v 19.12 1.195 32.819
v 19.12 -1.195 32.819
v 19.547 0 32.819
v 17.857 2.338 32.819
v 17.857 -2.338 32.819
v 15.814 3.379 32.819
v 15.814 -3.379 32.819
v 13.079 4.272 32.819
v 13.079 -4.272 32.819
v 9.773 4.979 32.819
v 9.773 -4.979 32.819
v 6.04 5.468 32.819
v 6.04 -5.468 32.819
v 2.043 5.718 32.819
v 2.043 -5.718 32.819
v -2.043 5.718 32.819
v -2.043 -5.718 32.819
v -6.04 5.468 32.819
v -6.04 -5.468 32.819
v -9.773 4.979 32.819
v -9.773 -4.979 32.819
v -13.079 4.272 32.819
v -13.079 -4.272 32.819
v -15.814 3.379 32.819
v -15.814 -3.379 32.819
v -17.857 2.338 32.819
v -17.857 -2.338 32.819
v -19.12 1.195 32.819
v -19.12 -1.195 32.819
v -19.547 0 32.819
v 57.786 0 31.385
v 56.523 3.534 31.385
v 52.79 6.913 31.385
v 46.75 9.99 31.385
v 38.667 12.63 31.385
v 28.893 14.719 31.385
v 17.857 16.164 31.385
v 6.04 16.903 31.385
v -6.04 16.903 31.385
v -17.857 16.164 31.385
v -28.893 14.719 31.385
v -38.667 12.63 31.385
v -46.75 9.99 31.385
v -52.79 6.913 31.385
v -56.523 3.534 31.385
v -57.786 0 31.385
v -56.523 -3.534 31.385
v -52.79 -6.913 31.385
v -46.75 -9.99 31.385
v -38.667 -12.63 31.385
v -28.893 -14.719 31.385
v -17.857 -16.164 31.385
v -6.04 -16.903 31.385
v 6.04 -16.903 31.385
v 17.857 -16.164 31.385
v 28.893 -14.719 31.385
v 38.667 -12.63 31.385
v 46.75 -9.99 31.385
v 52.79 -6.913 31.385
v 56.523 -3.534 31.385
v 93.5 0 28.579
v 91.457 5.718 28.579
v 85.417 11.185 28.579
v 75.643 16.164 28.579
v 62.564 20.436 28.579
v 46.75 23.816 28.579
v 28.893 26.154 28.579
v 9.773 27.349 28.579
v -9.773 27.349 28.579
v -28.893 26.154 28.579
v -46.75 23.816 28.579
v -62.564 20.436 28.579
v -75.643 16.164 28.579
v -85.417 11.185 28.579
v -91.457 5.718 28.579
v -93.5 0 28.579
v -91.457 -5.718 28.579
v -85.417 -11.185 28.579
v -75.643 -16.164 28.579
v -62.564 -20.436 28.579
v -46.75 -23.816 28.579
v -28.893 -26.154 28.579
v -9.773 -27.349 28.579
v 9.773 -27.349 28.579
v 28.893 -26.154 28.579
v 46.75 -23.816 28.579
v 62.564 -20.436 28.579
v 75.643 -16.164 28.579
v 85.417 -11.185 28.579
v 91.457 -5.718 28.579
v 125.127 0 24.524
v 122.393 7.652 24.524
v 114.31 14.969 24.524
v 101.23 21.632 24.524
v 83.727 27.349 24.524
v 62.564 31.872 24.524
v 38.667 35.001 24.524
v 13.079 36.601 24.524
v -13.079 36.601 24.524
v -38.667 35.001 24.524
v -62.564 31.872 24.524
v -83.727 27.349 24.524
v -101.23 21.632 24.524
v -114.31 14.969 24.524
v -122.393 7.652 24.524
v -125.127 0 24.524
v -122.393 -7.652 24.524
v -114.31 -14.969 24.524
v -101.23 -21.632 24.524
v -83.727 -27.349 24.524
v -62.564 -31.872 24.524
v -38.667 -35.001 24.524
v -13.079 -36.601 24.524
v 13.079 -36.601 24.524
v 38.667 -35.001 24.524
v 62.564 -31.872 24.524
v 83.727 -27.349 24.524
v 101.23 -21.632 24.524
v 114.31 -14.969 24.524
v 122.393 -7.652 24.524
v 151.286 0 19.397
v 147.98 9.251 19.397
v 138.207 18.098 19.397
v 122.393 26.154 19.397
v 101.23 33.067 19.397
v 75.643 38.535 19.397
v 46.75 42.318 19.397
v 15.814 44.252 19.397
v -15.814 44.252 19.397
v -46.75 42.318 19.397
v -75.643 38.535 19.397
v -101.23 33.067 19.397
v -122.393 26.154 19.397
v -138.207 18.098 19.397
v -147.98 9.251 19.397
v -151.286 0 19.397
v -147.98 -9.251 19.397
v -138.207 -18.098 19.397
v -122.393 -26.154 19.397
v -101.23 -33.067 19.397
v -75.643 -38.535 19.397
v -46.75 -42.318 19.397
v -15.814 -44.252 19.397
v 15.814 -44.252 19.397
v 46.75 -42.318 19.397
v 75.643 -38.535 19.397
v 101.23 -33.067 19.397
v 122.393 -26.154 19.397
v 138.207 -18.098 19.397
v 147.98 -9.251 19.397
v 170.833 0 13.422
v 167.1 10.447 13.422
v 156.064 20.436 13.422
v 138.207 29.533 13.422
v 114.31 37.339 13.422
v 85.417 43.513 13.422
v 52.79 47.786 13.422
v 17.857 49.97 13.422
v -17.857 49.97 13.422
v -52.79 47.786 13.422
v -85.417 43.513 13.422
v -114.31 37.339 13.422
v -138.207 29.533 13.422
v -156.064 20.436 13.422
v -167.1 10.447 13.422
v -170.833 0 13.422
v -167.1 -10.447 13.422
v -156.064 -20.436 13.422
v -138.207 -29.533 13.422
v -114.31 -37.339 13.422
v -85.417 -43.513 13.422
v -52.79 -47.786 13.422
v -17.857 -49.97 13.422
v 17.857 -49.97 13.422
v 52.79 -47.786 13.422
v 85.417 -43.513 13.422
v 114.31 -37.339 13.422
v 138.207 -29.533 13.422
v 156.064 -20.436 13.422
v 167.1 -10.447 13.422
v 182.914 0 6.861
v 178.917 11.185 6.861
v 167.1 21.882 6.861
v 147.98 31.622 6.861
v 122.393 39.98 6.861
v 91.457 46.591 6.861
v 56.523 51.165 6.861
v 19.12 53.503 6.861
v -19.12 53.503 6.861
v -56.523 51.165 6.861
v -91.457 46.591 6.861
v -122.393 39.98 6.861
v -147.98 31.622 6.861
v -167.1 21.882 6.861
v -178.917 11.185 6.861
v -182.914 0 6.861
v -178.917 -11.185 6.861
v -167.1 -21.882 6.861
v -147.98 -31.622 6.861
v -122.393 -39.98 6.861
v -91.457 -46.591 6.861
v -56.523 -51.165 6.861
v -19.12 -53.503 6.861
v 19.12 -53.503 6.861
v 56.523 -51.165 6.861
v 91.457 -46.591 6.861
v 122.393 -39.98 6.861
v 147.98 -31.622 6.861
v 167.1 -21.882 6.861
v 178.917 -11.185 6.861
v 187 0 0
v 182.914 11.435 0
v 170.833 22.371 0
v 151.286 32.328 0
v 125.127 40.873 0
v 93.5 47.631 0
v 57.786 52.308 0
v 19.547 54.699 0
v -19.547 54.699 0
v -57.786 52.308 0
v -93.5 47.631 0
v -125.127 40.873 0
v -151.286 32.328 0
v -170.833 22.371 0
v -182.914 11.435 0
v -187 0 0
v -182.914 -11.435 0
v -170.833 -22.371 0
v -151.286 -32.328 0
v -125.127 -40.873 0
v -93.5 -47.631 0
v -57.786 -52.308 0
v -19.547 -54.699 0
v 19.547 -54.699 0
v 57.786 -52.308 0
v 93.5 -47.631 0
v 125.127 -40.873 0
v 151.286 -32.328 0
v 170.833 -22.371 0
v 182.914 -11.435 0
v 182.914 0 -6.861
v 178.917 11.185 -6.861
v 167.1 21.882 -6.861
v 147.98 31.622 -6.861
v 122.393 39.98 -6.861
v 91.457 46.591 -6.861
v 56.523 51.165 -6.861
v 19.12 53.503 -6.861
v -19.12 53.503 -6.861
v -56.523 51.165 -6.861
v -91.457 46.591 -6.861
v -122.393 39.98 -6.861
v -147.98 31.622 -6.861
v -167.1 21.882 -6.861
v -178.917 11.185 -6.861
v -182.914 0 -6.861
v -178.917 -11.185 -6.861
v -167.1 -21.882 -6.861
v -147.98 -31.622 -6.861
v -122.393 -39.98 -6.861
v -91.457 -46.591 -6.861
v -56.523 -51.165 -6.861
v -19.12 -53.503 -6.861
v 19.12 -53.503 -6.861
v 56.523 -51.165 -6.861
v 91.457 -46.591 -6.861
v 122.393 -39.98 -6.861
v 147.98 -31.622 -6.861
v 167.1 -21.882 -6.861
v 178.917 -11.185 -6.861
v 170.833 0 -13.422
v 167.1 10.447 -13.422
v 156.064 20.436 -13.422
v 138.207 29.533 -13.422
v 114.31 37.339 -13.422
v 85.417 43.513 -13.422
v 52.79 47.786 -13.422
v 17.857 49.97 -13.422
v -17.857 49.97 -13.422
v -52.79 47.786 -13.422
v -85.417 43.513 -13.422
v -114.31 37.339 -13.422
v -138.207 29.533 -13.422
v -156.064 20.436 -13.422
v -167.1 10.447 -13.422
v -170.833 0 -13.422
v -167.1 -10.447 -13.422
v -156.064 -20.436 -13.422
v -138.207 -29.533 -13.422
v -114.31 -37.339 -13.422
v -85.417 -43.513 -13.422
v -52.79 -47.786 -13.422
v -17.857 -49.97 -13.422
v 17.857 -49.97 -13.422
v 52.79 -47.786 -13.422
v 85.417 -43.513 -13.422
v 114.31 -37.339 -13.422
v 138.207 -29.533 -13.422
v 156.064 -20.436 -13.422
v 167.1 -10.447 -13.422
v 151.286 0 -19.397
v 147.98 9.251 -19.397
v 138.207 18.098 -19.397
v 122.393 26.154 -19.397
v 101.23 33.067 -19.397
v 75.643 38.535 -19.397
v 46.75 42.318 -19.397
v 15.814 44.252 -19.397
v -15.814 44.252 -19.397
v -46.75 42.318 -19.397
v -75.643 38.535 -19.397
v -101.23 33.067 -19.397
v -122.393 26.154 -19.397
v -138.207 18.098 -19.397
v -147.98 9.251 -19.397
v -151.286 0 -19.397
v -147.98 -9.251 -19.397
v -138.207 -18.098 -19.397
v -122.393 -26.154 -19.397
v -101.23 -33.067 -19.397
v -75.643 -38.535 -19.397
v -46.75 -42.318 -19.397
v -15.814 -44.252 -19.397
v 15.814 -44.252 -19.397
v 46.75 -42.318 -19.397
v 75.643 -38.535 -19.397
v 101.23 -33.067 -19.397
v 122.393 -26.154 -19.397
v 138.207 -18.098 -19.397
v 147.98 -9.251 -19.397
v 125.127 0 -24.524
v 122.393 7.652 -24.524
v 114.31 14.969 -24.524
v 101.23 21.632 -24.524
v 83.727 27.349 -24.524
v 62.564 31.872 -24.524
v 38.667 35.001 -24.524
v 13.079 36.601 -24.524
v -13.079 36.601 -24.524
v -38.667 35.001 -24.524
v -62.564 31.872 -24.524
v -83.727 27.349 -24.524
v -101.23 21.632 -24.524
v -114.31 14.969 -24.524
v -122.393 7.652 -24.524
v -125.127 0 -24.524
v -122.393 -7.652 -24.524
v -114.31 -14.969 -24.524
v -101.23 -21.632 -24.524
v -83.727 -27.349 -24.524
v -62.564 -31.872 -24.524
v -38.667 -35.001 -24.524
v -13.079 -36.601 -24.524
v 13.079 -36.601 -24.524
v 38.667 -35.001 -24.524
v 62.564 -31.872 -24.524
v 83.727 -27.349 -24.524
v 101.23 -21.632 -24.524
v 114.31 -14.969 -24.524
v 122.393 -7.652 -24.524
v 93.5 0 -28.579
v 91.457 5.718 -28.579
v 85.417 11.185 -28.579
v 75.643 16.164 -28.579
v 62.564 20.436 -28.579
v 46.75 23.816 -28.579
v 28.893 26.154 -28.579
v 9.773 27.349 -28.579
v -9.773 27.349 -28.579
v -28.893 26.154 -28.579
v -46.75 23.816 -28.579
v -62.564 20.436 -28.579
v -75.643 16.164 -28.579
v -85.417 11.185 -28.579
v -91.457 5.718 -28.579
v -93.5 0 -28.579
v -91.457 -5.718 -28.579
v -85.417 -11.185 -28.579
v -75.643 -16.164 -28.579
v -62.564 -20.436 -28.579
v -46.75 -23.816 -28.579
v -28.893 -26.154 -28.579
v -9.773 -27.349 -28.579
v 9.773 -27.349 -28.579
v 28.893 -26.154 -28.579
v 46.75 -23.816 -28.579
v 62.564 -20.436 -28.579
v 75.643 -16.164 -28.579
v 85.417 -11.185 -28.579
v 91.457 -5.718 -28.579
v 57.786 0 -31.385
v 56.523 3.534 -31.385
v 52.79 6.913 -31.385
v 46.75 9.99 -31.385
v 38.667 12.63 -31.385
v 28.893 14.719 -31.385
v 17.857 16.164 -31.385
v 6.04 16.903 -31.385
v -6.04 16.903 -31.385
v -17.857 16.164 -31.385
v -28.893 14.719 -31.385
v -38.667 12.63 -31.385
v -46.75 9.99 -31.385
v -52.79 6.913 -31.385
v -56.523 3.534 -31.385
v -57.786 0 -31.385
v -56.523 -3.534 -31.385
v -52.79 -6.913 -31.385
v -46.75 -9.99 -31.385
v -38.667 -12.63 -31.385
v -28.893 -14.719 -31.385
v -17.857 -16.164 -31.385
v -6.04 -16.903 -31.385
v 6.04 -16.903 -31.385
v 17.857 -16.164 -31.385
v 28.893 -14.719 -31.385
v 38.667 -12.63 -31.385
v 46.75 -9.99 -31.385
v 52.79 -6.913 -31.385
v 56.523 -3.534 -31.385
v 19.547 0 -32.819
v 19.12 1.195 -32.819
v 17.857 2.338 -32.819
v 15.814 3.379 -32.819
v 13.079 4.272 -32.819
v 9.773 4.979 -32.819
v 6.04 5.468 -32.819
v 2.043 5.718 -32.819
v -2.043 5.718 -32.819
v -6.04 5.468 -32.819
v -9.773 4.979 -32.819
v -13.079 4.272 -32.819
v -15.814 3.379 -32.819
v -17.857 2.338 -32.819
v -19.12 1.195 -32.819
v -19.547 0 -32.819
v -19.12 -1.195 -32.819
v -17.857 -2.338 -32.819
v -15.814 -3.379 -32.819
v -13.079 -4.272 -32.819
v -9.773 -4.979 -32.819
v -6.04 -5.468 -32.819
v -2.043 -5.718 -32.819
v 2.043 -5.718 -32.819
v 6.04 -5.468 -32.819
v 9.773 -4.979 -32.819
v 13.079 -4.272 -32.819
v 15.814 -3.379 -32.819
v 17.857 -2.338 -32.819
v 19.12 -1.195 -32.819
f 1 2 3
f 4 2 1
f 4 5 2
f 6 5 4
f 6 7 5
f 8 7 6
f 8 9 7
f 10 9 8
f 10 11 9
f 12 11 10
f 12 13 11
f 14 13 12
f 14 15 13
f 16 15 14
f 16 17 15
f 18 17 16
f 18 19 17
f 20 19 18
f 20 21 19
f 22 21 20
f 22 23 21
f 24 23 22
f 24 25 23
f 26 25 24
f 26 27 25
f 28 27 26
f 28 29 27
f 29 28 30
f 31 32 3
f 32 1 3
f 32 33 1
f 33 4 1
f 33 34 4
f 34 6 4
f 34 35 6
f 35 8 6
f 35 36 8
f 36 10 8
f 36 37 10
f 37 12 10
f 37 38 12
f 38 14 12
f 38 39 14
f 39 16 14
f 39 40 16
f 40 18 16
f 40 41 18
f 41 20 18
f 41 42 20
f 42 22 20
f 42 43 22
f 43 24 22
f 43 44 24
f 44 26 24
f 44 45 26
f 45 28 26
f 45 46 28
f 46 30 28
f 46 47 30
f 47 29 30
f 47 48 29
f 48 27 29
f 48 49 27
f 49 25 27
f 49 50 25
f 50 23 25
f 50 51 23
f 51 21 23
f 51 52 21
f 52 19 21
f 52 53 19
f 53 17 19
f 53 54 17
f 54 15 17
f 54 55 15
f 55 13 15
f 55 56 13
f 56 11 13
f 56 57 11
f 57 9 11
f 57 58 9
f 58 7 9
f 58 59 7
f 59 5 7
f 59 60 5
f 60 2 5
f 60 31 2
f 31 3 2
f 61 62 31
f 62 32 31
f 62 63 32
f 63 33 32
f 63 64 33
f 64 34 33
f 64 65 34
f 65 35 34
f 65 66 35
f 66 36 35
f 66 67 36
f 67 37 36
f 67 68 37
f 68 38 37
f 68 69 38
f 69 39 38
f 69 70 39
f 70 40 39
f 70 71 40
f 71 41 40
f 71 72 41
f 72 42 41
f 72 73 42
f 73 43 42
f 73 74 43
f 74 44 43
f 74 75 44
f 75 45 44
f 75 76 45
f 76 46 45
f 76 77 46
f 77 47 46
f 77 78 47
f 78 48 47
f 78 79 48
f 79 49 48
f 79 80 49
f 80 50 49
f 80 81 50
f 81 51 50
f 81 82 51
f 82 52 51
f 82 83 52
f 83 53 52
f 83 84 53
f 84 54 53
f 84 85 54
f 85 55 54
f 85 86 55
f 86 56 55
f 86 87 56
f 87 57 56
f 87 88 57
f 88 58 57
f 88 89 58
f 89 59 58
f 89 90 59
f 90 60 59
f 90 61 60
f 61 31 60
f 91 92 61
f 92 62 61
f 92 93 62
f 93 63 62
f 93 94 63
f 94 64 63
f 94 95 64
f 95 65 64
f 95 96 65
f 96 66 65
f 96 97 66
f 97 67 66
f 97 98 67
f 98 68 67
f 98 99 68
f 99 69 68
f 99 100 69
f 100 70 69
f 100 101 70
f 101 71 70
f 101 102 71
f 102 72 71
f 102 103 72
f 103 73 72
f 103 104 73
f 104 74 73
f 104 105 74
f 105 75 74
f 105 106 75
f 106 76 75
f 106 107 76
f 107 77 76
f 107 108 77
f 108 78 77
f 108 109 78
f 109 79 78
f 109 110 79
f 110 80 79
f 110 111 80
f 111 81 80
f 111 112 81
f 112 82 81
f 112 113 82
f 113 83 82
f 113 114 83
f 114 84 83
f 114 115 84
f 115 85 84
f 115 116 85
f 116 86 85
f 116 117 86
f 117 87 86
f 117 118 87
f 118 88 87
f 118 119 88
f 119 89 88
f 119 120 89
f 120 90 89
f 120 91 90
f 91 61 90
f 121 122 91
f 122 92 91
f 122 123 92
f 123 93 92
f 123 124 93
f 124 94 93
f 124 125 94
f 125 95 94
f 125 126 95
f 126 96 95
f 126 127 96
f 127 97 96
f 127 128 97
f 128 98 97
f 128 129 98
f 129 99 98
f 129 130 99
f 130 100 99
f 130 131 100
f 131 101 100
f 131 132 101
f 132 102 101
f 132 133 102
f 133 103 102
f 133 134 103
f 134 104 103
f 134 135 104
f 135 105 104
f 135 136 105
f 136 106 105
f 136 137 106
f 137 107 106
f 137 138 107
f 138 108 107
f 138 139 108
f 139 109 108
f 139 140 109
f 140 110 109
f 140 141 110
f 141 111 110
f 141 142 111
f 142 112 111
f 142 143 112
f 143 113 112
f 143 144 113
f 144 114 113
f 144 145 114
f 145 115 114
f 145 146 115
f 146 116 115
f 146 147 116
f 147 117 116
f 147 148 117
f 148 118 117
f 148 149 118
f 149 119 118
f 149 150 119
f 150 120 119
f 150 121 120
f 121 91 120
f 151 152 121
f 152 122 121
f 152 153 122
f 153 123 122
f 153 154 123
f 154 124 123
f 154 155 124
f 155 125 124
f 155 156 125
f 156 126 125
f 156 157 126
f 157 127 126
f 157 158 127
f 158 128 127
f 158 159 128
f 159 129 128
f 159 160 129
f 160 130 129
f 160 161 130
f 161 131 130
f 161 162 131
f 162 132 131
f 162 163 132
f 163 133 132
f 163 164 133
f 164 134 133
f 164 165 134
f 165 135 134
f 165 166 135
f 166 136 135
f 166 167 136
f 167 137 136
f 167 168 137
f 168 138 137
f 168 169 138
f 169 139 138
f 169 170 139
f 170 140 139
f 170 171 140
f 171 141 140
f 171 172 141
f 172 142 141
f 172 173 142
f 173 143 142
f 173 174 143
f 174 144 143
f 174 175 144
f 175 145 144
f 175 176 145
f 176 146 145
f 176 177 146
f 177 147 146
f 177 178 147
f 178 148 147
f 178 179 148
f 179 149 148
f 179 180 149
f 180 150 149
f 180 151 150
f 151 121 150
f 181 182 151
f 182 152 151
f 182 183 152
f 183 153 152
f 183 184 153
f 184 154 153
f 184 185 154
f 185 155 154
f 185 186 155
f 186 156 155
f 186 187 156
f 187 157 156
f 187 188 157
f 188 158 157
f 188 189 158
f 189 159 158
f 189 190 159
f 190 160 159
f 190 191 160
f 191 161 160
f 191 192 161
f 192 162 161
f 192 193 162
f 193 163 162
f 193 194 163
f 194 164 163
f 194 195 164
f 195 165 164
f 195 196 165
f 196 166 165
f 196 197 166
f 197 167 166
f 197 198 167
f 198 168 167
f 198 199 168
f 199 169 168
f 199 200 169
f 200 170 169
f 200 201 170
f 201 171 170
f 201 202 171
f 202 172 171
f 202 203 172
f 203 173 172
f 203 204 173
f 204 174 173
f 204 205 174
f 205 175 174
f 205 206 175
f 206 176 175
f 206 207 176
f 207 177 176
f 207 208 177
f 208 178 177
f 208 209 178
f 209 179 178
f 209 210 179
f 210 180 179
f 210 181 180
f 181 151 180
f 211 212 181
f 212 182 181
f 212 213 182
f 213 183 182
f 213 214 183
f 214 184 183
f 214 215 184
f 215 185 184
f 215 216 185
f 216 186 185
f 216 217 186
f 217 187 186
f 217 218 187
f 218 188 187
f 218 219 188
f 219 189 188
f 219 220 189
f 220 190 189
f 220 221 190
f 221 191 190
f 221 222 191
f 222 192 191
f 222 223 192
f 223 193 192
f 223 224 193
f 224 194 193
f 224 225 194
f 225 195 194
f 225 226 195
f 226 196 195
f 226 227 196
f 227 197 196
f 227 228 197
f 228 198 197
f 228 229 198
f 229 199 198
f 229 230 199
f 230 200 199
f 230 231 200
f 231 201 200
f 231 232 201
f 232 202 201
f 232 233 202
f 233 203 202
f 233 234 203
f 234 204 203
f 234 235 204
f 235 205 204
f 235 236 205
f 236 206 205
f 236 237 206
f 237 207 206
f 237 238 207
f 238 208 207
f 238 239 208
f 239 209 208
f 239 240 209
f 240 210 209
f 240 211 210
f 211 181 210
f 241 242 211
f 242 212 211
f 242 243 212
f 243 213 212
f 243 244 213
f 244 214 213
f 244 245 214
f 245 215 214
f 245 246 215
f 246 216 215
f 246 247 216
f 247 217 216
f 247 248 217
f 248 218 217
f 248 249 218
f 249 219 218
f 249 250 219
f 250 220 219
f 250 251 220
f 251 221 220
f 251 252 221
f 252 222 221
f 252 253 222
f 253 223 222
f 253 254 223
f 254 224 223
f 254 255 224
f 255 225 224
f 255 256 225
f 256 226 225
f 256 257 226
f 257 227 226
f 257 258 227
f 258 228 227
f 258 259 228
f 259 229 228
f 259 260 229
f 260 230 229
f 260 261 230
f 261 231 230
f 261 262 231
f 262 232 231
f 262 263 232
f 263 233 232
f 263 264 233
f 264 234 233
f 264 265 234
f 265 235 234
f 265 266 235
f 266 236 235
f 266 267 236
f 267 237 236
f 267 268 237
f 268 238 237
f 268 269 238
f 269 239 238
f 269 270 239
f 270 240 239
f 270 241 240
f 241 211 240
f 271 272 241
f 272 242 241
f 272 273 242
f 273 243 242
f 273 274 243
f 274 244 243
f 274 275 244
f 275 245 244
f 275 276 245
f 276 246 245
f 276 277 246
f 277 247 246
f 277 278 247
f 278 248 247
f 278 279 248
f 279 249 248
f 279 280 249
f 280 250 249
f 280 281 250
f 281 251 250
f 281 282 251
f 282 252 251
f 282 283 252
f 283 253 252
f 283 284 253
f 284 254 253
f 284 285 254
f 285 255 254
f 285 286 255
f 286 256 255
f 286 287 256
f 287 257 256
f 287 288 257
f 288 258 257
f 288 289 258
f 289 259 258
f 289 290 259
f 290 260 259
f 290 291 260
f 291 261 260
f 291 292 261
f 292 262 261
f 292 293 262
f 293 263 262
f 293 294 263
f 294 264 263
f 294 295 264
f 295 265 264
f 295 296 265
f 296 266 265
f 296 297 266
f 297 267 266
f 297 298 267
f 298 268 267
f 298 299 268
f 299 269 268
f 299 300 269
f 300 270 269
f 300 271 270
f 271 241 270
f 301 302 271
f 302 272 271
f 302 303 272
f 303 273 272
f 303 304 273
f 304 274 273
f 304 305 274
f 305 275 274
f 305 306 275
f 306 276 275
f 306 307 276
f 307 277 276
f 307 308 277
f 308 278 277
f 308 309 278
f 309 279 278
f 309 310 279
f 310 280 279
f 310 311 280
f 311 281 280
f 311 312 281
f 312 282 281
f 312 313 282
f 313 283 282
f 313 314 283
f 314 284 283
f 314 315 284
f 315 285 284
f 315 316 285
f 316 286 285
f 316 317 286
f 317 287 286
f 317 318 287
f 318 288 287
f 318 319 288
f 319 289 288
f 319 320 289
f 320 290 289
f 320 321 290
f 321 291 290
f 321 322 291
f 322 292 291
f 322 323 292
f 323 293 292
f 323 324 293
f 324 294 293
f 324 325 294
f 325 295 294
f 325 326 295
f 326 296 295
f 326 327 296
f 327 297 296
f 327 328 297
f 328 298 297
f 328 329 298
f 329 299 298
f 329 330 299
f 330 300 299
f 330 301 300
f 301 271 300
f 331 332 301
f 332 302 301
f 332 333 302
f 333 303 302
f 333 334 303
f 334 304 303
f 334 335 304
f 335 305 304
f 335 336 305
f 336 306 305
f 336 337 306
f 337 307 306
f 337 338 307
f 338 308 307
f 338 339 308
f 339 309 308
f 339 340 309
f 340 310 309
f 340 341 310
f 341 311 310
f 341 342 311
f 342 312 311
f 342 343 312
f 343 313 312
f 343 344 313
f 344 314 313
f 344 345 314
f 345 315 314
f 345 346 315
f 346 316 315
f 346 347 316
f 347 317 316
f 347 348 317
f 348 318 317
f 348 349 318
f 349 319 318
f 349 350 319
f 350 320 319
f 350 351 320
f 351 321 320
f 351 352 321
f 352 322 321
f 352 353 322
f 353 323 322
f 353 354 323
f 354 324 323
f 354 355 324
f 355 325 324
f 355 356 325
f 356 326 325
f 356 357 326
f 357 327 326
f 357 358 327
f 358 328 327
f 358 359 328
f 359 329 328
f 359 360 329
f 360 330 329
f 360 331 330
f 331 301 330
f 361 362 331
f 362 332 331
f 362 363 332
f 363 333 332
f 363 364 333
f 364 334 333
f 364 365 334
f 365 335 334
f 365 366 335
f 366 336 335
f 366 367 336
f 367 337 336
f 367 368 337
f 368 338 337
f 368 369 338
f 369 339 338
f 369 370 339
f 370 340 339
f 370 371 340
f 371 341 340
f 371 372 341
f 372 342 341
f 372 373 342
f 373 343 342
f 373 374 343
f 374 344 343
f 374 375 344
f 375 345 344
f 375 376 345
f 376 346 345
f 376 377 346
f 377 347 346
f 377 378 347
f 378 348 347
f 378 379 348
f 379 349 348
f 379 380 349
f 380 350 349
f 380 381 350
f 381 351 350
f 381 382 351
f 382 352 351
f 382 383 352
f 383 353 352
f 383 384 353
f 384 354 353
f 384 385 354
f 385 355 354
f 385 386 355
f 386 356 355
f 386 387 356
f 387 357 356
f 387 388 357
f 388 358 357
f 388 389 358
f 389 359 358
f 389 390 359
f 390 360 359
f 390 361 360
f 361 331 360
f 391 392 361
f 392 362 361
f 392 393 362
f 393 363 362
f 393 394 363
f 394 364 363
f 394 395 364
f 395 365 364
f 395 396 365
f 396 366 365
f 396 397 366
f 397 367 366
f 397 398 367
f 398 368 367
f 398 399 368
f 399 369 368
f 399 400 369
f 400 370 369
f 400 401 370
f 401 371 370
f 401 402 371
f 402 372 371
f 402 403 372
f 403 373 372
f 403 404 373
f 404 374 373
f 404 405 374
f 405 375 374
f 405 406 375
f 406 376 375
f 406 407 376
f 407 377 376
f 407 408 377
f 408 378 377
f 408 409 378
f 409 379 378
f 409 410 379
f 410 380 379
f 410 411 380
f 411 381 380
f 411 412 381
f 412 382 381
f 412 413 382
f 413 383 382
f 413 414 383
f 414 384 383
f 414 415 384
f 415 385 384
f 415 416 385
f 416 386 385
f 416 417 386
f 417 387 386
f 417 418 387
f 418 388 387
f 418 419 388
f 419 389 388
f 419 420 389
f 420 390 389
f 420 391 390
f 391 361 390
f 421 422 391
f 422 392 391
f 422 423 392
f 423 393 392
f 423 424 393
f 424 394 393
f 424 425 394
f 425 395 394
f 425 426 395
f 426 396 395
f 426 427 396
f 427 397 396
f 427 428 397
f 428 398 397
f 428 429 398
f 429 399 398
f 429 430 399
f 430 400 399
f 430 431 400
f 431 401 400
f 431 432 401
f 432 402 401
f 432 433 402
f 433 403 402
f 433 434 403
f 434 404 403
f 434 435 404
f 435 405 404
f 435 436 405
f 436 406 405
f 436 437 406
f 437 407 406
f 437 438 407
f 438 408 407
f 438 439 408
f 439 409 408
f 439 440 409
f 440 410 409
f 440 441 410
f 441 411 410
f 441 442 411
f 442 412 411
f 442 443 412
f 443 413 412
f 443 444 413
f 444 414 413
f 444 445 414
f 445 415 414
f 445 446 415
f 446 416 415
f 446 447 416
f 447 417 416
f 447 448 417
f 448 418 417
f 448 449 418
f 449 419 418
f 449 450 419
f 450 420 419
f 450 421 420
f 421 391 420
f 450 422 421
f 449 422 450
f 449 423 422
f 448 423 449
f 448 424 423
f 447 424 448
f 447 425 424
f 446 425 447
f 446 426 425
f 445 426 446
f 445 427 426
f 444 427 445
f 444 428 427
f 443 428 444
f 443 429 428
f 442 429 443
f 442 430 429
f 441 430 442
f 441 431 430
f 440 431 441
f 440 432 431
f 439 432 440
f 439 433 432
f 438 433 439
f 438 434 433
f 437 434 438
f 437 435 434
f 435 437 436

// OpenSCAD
// Generated by SolidPython 1.0.1 on 2020-07-29 00:46:52


scale(v = [17, 5, 3]) {
	sphere(r = 11);
}
/***********************************************
*********      SolidPython code:      **********
************************************************
 
# import packages: SolidPython
from solid import *
from solid.utils import *
from itertools import chain, combinations, permutations


class Resize:

    def __init__(self, scad_file):
        self.scad_file = scad_file
        #self.scad_file = import_scad(scad_file)
        # cone/cylinder param:
        self.r1 = 0
        self.r2 = 0
        self.h = 0
        # rectangular prism param:
        self.w = 0
        self.l = 0
        # ellipse param:
        self.r = 0

    # import OpenScad code (file name corresponds to shape)


    # classify shape + parameters
    def assign(self, param1, param2, param3):
        if self.scad_file == 'cone.scad':
            self.r1 = param1
            self.r2 = param2
            self.h = param3
        elif self.scad_file == 'cylinder.scad':
            self.r1 = param1
            self.r2 = param2
            self.h = param3
        elif self.scad_file == 'rectangularPrism.scad':
            self.h = param1
            self.l = param2
            self.w = param3
        else:
            self.r = param1
            self.h = param2

    # resize parameters
    def iterate(self):
        x = range(3, 20, 2)
        i = 1
        if self.scad_file == 'cone.scad':
            tempList = list(permutations(x, 2))
            for temp in tempList:
                param1 = temp[0]
                param2 = temp[1]
                filepath = 'produced_scad_files/' + 'cone' + str(param1) + '_' + str(param2) + '_' + '.scad'
                scad_render_to_file(cylinder(h=param1, r1=param2, r2=0), filepath)

        elif self.scad_file == 'cylinder.scad':
            tempList = list(permutations(x, 3))
            for temp in tempList:
                param1 = temp[0]
                param2 = temp[1]
                filepath = 'produced_scad_files/' + 'cylinder' + str(param1) + '_' + str(param2) + '_' + '.scad'
                scad_render_to_file(cylinder(h=param1, r1=param2, r2=param2), filepath)

        elif self.scad_file == 'rectangularPrism.scad':
            tempList = list(permutations(x, 3))
            for temp in tempList:
                param1 = temp[0]
                param2 = temp[1]
                param3 = temp[2]
                filepath = 'produced_scad_files/' + 'rectangularPrism' + str(param1) + '_' + str(param2) + '_' + str(
                    param3) + '.scad'
                scad_render_to_file(cube(size=(param1, param2, param3)), filepath)

        elif self.scad_file == 'ellipse.scad':
            tempList = list(permutations(x, 4))
            for temp in tempList:
                param1 = temp[0]
                param2 = temp[1]
                param3 = temp[2]
                param4 = temp[3]
                filepath = 'produced_scad_files/' + 'ellipse' + str(param1) + '_' + str(param2) + '_' + str(param3) + '_' + str(param4) + '.scad'
                scad_render_to_file(scale([param1, param2, param3])(sphere(r=param4)), filepath)

    def render_to_scadfile(self):
        scad_render_to_file(scad, 'example.scad') 
 
************************************************/
